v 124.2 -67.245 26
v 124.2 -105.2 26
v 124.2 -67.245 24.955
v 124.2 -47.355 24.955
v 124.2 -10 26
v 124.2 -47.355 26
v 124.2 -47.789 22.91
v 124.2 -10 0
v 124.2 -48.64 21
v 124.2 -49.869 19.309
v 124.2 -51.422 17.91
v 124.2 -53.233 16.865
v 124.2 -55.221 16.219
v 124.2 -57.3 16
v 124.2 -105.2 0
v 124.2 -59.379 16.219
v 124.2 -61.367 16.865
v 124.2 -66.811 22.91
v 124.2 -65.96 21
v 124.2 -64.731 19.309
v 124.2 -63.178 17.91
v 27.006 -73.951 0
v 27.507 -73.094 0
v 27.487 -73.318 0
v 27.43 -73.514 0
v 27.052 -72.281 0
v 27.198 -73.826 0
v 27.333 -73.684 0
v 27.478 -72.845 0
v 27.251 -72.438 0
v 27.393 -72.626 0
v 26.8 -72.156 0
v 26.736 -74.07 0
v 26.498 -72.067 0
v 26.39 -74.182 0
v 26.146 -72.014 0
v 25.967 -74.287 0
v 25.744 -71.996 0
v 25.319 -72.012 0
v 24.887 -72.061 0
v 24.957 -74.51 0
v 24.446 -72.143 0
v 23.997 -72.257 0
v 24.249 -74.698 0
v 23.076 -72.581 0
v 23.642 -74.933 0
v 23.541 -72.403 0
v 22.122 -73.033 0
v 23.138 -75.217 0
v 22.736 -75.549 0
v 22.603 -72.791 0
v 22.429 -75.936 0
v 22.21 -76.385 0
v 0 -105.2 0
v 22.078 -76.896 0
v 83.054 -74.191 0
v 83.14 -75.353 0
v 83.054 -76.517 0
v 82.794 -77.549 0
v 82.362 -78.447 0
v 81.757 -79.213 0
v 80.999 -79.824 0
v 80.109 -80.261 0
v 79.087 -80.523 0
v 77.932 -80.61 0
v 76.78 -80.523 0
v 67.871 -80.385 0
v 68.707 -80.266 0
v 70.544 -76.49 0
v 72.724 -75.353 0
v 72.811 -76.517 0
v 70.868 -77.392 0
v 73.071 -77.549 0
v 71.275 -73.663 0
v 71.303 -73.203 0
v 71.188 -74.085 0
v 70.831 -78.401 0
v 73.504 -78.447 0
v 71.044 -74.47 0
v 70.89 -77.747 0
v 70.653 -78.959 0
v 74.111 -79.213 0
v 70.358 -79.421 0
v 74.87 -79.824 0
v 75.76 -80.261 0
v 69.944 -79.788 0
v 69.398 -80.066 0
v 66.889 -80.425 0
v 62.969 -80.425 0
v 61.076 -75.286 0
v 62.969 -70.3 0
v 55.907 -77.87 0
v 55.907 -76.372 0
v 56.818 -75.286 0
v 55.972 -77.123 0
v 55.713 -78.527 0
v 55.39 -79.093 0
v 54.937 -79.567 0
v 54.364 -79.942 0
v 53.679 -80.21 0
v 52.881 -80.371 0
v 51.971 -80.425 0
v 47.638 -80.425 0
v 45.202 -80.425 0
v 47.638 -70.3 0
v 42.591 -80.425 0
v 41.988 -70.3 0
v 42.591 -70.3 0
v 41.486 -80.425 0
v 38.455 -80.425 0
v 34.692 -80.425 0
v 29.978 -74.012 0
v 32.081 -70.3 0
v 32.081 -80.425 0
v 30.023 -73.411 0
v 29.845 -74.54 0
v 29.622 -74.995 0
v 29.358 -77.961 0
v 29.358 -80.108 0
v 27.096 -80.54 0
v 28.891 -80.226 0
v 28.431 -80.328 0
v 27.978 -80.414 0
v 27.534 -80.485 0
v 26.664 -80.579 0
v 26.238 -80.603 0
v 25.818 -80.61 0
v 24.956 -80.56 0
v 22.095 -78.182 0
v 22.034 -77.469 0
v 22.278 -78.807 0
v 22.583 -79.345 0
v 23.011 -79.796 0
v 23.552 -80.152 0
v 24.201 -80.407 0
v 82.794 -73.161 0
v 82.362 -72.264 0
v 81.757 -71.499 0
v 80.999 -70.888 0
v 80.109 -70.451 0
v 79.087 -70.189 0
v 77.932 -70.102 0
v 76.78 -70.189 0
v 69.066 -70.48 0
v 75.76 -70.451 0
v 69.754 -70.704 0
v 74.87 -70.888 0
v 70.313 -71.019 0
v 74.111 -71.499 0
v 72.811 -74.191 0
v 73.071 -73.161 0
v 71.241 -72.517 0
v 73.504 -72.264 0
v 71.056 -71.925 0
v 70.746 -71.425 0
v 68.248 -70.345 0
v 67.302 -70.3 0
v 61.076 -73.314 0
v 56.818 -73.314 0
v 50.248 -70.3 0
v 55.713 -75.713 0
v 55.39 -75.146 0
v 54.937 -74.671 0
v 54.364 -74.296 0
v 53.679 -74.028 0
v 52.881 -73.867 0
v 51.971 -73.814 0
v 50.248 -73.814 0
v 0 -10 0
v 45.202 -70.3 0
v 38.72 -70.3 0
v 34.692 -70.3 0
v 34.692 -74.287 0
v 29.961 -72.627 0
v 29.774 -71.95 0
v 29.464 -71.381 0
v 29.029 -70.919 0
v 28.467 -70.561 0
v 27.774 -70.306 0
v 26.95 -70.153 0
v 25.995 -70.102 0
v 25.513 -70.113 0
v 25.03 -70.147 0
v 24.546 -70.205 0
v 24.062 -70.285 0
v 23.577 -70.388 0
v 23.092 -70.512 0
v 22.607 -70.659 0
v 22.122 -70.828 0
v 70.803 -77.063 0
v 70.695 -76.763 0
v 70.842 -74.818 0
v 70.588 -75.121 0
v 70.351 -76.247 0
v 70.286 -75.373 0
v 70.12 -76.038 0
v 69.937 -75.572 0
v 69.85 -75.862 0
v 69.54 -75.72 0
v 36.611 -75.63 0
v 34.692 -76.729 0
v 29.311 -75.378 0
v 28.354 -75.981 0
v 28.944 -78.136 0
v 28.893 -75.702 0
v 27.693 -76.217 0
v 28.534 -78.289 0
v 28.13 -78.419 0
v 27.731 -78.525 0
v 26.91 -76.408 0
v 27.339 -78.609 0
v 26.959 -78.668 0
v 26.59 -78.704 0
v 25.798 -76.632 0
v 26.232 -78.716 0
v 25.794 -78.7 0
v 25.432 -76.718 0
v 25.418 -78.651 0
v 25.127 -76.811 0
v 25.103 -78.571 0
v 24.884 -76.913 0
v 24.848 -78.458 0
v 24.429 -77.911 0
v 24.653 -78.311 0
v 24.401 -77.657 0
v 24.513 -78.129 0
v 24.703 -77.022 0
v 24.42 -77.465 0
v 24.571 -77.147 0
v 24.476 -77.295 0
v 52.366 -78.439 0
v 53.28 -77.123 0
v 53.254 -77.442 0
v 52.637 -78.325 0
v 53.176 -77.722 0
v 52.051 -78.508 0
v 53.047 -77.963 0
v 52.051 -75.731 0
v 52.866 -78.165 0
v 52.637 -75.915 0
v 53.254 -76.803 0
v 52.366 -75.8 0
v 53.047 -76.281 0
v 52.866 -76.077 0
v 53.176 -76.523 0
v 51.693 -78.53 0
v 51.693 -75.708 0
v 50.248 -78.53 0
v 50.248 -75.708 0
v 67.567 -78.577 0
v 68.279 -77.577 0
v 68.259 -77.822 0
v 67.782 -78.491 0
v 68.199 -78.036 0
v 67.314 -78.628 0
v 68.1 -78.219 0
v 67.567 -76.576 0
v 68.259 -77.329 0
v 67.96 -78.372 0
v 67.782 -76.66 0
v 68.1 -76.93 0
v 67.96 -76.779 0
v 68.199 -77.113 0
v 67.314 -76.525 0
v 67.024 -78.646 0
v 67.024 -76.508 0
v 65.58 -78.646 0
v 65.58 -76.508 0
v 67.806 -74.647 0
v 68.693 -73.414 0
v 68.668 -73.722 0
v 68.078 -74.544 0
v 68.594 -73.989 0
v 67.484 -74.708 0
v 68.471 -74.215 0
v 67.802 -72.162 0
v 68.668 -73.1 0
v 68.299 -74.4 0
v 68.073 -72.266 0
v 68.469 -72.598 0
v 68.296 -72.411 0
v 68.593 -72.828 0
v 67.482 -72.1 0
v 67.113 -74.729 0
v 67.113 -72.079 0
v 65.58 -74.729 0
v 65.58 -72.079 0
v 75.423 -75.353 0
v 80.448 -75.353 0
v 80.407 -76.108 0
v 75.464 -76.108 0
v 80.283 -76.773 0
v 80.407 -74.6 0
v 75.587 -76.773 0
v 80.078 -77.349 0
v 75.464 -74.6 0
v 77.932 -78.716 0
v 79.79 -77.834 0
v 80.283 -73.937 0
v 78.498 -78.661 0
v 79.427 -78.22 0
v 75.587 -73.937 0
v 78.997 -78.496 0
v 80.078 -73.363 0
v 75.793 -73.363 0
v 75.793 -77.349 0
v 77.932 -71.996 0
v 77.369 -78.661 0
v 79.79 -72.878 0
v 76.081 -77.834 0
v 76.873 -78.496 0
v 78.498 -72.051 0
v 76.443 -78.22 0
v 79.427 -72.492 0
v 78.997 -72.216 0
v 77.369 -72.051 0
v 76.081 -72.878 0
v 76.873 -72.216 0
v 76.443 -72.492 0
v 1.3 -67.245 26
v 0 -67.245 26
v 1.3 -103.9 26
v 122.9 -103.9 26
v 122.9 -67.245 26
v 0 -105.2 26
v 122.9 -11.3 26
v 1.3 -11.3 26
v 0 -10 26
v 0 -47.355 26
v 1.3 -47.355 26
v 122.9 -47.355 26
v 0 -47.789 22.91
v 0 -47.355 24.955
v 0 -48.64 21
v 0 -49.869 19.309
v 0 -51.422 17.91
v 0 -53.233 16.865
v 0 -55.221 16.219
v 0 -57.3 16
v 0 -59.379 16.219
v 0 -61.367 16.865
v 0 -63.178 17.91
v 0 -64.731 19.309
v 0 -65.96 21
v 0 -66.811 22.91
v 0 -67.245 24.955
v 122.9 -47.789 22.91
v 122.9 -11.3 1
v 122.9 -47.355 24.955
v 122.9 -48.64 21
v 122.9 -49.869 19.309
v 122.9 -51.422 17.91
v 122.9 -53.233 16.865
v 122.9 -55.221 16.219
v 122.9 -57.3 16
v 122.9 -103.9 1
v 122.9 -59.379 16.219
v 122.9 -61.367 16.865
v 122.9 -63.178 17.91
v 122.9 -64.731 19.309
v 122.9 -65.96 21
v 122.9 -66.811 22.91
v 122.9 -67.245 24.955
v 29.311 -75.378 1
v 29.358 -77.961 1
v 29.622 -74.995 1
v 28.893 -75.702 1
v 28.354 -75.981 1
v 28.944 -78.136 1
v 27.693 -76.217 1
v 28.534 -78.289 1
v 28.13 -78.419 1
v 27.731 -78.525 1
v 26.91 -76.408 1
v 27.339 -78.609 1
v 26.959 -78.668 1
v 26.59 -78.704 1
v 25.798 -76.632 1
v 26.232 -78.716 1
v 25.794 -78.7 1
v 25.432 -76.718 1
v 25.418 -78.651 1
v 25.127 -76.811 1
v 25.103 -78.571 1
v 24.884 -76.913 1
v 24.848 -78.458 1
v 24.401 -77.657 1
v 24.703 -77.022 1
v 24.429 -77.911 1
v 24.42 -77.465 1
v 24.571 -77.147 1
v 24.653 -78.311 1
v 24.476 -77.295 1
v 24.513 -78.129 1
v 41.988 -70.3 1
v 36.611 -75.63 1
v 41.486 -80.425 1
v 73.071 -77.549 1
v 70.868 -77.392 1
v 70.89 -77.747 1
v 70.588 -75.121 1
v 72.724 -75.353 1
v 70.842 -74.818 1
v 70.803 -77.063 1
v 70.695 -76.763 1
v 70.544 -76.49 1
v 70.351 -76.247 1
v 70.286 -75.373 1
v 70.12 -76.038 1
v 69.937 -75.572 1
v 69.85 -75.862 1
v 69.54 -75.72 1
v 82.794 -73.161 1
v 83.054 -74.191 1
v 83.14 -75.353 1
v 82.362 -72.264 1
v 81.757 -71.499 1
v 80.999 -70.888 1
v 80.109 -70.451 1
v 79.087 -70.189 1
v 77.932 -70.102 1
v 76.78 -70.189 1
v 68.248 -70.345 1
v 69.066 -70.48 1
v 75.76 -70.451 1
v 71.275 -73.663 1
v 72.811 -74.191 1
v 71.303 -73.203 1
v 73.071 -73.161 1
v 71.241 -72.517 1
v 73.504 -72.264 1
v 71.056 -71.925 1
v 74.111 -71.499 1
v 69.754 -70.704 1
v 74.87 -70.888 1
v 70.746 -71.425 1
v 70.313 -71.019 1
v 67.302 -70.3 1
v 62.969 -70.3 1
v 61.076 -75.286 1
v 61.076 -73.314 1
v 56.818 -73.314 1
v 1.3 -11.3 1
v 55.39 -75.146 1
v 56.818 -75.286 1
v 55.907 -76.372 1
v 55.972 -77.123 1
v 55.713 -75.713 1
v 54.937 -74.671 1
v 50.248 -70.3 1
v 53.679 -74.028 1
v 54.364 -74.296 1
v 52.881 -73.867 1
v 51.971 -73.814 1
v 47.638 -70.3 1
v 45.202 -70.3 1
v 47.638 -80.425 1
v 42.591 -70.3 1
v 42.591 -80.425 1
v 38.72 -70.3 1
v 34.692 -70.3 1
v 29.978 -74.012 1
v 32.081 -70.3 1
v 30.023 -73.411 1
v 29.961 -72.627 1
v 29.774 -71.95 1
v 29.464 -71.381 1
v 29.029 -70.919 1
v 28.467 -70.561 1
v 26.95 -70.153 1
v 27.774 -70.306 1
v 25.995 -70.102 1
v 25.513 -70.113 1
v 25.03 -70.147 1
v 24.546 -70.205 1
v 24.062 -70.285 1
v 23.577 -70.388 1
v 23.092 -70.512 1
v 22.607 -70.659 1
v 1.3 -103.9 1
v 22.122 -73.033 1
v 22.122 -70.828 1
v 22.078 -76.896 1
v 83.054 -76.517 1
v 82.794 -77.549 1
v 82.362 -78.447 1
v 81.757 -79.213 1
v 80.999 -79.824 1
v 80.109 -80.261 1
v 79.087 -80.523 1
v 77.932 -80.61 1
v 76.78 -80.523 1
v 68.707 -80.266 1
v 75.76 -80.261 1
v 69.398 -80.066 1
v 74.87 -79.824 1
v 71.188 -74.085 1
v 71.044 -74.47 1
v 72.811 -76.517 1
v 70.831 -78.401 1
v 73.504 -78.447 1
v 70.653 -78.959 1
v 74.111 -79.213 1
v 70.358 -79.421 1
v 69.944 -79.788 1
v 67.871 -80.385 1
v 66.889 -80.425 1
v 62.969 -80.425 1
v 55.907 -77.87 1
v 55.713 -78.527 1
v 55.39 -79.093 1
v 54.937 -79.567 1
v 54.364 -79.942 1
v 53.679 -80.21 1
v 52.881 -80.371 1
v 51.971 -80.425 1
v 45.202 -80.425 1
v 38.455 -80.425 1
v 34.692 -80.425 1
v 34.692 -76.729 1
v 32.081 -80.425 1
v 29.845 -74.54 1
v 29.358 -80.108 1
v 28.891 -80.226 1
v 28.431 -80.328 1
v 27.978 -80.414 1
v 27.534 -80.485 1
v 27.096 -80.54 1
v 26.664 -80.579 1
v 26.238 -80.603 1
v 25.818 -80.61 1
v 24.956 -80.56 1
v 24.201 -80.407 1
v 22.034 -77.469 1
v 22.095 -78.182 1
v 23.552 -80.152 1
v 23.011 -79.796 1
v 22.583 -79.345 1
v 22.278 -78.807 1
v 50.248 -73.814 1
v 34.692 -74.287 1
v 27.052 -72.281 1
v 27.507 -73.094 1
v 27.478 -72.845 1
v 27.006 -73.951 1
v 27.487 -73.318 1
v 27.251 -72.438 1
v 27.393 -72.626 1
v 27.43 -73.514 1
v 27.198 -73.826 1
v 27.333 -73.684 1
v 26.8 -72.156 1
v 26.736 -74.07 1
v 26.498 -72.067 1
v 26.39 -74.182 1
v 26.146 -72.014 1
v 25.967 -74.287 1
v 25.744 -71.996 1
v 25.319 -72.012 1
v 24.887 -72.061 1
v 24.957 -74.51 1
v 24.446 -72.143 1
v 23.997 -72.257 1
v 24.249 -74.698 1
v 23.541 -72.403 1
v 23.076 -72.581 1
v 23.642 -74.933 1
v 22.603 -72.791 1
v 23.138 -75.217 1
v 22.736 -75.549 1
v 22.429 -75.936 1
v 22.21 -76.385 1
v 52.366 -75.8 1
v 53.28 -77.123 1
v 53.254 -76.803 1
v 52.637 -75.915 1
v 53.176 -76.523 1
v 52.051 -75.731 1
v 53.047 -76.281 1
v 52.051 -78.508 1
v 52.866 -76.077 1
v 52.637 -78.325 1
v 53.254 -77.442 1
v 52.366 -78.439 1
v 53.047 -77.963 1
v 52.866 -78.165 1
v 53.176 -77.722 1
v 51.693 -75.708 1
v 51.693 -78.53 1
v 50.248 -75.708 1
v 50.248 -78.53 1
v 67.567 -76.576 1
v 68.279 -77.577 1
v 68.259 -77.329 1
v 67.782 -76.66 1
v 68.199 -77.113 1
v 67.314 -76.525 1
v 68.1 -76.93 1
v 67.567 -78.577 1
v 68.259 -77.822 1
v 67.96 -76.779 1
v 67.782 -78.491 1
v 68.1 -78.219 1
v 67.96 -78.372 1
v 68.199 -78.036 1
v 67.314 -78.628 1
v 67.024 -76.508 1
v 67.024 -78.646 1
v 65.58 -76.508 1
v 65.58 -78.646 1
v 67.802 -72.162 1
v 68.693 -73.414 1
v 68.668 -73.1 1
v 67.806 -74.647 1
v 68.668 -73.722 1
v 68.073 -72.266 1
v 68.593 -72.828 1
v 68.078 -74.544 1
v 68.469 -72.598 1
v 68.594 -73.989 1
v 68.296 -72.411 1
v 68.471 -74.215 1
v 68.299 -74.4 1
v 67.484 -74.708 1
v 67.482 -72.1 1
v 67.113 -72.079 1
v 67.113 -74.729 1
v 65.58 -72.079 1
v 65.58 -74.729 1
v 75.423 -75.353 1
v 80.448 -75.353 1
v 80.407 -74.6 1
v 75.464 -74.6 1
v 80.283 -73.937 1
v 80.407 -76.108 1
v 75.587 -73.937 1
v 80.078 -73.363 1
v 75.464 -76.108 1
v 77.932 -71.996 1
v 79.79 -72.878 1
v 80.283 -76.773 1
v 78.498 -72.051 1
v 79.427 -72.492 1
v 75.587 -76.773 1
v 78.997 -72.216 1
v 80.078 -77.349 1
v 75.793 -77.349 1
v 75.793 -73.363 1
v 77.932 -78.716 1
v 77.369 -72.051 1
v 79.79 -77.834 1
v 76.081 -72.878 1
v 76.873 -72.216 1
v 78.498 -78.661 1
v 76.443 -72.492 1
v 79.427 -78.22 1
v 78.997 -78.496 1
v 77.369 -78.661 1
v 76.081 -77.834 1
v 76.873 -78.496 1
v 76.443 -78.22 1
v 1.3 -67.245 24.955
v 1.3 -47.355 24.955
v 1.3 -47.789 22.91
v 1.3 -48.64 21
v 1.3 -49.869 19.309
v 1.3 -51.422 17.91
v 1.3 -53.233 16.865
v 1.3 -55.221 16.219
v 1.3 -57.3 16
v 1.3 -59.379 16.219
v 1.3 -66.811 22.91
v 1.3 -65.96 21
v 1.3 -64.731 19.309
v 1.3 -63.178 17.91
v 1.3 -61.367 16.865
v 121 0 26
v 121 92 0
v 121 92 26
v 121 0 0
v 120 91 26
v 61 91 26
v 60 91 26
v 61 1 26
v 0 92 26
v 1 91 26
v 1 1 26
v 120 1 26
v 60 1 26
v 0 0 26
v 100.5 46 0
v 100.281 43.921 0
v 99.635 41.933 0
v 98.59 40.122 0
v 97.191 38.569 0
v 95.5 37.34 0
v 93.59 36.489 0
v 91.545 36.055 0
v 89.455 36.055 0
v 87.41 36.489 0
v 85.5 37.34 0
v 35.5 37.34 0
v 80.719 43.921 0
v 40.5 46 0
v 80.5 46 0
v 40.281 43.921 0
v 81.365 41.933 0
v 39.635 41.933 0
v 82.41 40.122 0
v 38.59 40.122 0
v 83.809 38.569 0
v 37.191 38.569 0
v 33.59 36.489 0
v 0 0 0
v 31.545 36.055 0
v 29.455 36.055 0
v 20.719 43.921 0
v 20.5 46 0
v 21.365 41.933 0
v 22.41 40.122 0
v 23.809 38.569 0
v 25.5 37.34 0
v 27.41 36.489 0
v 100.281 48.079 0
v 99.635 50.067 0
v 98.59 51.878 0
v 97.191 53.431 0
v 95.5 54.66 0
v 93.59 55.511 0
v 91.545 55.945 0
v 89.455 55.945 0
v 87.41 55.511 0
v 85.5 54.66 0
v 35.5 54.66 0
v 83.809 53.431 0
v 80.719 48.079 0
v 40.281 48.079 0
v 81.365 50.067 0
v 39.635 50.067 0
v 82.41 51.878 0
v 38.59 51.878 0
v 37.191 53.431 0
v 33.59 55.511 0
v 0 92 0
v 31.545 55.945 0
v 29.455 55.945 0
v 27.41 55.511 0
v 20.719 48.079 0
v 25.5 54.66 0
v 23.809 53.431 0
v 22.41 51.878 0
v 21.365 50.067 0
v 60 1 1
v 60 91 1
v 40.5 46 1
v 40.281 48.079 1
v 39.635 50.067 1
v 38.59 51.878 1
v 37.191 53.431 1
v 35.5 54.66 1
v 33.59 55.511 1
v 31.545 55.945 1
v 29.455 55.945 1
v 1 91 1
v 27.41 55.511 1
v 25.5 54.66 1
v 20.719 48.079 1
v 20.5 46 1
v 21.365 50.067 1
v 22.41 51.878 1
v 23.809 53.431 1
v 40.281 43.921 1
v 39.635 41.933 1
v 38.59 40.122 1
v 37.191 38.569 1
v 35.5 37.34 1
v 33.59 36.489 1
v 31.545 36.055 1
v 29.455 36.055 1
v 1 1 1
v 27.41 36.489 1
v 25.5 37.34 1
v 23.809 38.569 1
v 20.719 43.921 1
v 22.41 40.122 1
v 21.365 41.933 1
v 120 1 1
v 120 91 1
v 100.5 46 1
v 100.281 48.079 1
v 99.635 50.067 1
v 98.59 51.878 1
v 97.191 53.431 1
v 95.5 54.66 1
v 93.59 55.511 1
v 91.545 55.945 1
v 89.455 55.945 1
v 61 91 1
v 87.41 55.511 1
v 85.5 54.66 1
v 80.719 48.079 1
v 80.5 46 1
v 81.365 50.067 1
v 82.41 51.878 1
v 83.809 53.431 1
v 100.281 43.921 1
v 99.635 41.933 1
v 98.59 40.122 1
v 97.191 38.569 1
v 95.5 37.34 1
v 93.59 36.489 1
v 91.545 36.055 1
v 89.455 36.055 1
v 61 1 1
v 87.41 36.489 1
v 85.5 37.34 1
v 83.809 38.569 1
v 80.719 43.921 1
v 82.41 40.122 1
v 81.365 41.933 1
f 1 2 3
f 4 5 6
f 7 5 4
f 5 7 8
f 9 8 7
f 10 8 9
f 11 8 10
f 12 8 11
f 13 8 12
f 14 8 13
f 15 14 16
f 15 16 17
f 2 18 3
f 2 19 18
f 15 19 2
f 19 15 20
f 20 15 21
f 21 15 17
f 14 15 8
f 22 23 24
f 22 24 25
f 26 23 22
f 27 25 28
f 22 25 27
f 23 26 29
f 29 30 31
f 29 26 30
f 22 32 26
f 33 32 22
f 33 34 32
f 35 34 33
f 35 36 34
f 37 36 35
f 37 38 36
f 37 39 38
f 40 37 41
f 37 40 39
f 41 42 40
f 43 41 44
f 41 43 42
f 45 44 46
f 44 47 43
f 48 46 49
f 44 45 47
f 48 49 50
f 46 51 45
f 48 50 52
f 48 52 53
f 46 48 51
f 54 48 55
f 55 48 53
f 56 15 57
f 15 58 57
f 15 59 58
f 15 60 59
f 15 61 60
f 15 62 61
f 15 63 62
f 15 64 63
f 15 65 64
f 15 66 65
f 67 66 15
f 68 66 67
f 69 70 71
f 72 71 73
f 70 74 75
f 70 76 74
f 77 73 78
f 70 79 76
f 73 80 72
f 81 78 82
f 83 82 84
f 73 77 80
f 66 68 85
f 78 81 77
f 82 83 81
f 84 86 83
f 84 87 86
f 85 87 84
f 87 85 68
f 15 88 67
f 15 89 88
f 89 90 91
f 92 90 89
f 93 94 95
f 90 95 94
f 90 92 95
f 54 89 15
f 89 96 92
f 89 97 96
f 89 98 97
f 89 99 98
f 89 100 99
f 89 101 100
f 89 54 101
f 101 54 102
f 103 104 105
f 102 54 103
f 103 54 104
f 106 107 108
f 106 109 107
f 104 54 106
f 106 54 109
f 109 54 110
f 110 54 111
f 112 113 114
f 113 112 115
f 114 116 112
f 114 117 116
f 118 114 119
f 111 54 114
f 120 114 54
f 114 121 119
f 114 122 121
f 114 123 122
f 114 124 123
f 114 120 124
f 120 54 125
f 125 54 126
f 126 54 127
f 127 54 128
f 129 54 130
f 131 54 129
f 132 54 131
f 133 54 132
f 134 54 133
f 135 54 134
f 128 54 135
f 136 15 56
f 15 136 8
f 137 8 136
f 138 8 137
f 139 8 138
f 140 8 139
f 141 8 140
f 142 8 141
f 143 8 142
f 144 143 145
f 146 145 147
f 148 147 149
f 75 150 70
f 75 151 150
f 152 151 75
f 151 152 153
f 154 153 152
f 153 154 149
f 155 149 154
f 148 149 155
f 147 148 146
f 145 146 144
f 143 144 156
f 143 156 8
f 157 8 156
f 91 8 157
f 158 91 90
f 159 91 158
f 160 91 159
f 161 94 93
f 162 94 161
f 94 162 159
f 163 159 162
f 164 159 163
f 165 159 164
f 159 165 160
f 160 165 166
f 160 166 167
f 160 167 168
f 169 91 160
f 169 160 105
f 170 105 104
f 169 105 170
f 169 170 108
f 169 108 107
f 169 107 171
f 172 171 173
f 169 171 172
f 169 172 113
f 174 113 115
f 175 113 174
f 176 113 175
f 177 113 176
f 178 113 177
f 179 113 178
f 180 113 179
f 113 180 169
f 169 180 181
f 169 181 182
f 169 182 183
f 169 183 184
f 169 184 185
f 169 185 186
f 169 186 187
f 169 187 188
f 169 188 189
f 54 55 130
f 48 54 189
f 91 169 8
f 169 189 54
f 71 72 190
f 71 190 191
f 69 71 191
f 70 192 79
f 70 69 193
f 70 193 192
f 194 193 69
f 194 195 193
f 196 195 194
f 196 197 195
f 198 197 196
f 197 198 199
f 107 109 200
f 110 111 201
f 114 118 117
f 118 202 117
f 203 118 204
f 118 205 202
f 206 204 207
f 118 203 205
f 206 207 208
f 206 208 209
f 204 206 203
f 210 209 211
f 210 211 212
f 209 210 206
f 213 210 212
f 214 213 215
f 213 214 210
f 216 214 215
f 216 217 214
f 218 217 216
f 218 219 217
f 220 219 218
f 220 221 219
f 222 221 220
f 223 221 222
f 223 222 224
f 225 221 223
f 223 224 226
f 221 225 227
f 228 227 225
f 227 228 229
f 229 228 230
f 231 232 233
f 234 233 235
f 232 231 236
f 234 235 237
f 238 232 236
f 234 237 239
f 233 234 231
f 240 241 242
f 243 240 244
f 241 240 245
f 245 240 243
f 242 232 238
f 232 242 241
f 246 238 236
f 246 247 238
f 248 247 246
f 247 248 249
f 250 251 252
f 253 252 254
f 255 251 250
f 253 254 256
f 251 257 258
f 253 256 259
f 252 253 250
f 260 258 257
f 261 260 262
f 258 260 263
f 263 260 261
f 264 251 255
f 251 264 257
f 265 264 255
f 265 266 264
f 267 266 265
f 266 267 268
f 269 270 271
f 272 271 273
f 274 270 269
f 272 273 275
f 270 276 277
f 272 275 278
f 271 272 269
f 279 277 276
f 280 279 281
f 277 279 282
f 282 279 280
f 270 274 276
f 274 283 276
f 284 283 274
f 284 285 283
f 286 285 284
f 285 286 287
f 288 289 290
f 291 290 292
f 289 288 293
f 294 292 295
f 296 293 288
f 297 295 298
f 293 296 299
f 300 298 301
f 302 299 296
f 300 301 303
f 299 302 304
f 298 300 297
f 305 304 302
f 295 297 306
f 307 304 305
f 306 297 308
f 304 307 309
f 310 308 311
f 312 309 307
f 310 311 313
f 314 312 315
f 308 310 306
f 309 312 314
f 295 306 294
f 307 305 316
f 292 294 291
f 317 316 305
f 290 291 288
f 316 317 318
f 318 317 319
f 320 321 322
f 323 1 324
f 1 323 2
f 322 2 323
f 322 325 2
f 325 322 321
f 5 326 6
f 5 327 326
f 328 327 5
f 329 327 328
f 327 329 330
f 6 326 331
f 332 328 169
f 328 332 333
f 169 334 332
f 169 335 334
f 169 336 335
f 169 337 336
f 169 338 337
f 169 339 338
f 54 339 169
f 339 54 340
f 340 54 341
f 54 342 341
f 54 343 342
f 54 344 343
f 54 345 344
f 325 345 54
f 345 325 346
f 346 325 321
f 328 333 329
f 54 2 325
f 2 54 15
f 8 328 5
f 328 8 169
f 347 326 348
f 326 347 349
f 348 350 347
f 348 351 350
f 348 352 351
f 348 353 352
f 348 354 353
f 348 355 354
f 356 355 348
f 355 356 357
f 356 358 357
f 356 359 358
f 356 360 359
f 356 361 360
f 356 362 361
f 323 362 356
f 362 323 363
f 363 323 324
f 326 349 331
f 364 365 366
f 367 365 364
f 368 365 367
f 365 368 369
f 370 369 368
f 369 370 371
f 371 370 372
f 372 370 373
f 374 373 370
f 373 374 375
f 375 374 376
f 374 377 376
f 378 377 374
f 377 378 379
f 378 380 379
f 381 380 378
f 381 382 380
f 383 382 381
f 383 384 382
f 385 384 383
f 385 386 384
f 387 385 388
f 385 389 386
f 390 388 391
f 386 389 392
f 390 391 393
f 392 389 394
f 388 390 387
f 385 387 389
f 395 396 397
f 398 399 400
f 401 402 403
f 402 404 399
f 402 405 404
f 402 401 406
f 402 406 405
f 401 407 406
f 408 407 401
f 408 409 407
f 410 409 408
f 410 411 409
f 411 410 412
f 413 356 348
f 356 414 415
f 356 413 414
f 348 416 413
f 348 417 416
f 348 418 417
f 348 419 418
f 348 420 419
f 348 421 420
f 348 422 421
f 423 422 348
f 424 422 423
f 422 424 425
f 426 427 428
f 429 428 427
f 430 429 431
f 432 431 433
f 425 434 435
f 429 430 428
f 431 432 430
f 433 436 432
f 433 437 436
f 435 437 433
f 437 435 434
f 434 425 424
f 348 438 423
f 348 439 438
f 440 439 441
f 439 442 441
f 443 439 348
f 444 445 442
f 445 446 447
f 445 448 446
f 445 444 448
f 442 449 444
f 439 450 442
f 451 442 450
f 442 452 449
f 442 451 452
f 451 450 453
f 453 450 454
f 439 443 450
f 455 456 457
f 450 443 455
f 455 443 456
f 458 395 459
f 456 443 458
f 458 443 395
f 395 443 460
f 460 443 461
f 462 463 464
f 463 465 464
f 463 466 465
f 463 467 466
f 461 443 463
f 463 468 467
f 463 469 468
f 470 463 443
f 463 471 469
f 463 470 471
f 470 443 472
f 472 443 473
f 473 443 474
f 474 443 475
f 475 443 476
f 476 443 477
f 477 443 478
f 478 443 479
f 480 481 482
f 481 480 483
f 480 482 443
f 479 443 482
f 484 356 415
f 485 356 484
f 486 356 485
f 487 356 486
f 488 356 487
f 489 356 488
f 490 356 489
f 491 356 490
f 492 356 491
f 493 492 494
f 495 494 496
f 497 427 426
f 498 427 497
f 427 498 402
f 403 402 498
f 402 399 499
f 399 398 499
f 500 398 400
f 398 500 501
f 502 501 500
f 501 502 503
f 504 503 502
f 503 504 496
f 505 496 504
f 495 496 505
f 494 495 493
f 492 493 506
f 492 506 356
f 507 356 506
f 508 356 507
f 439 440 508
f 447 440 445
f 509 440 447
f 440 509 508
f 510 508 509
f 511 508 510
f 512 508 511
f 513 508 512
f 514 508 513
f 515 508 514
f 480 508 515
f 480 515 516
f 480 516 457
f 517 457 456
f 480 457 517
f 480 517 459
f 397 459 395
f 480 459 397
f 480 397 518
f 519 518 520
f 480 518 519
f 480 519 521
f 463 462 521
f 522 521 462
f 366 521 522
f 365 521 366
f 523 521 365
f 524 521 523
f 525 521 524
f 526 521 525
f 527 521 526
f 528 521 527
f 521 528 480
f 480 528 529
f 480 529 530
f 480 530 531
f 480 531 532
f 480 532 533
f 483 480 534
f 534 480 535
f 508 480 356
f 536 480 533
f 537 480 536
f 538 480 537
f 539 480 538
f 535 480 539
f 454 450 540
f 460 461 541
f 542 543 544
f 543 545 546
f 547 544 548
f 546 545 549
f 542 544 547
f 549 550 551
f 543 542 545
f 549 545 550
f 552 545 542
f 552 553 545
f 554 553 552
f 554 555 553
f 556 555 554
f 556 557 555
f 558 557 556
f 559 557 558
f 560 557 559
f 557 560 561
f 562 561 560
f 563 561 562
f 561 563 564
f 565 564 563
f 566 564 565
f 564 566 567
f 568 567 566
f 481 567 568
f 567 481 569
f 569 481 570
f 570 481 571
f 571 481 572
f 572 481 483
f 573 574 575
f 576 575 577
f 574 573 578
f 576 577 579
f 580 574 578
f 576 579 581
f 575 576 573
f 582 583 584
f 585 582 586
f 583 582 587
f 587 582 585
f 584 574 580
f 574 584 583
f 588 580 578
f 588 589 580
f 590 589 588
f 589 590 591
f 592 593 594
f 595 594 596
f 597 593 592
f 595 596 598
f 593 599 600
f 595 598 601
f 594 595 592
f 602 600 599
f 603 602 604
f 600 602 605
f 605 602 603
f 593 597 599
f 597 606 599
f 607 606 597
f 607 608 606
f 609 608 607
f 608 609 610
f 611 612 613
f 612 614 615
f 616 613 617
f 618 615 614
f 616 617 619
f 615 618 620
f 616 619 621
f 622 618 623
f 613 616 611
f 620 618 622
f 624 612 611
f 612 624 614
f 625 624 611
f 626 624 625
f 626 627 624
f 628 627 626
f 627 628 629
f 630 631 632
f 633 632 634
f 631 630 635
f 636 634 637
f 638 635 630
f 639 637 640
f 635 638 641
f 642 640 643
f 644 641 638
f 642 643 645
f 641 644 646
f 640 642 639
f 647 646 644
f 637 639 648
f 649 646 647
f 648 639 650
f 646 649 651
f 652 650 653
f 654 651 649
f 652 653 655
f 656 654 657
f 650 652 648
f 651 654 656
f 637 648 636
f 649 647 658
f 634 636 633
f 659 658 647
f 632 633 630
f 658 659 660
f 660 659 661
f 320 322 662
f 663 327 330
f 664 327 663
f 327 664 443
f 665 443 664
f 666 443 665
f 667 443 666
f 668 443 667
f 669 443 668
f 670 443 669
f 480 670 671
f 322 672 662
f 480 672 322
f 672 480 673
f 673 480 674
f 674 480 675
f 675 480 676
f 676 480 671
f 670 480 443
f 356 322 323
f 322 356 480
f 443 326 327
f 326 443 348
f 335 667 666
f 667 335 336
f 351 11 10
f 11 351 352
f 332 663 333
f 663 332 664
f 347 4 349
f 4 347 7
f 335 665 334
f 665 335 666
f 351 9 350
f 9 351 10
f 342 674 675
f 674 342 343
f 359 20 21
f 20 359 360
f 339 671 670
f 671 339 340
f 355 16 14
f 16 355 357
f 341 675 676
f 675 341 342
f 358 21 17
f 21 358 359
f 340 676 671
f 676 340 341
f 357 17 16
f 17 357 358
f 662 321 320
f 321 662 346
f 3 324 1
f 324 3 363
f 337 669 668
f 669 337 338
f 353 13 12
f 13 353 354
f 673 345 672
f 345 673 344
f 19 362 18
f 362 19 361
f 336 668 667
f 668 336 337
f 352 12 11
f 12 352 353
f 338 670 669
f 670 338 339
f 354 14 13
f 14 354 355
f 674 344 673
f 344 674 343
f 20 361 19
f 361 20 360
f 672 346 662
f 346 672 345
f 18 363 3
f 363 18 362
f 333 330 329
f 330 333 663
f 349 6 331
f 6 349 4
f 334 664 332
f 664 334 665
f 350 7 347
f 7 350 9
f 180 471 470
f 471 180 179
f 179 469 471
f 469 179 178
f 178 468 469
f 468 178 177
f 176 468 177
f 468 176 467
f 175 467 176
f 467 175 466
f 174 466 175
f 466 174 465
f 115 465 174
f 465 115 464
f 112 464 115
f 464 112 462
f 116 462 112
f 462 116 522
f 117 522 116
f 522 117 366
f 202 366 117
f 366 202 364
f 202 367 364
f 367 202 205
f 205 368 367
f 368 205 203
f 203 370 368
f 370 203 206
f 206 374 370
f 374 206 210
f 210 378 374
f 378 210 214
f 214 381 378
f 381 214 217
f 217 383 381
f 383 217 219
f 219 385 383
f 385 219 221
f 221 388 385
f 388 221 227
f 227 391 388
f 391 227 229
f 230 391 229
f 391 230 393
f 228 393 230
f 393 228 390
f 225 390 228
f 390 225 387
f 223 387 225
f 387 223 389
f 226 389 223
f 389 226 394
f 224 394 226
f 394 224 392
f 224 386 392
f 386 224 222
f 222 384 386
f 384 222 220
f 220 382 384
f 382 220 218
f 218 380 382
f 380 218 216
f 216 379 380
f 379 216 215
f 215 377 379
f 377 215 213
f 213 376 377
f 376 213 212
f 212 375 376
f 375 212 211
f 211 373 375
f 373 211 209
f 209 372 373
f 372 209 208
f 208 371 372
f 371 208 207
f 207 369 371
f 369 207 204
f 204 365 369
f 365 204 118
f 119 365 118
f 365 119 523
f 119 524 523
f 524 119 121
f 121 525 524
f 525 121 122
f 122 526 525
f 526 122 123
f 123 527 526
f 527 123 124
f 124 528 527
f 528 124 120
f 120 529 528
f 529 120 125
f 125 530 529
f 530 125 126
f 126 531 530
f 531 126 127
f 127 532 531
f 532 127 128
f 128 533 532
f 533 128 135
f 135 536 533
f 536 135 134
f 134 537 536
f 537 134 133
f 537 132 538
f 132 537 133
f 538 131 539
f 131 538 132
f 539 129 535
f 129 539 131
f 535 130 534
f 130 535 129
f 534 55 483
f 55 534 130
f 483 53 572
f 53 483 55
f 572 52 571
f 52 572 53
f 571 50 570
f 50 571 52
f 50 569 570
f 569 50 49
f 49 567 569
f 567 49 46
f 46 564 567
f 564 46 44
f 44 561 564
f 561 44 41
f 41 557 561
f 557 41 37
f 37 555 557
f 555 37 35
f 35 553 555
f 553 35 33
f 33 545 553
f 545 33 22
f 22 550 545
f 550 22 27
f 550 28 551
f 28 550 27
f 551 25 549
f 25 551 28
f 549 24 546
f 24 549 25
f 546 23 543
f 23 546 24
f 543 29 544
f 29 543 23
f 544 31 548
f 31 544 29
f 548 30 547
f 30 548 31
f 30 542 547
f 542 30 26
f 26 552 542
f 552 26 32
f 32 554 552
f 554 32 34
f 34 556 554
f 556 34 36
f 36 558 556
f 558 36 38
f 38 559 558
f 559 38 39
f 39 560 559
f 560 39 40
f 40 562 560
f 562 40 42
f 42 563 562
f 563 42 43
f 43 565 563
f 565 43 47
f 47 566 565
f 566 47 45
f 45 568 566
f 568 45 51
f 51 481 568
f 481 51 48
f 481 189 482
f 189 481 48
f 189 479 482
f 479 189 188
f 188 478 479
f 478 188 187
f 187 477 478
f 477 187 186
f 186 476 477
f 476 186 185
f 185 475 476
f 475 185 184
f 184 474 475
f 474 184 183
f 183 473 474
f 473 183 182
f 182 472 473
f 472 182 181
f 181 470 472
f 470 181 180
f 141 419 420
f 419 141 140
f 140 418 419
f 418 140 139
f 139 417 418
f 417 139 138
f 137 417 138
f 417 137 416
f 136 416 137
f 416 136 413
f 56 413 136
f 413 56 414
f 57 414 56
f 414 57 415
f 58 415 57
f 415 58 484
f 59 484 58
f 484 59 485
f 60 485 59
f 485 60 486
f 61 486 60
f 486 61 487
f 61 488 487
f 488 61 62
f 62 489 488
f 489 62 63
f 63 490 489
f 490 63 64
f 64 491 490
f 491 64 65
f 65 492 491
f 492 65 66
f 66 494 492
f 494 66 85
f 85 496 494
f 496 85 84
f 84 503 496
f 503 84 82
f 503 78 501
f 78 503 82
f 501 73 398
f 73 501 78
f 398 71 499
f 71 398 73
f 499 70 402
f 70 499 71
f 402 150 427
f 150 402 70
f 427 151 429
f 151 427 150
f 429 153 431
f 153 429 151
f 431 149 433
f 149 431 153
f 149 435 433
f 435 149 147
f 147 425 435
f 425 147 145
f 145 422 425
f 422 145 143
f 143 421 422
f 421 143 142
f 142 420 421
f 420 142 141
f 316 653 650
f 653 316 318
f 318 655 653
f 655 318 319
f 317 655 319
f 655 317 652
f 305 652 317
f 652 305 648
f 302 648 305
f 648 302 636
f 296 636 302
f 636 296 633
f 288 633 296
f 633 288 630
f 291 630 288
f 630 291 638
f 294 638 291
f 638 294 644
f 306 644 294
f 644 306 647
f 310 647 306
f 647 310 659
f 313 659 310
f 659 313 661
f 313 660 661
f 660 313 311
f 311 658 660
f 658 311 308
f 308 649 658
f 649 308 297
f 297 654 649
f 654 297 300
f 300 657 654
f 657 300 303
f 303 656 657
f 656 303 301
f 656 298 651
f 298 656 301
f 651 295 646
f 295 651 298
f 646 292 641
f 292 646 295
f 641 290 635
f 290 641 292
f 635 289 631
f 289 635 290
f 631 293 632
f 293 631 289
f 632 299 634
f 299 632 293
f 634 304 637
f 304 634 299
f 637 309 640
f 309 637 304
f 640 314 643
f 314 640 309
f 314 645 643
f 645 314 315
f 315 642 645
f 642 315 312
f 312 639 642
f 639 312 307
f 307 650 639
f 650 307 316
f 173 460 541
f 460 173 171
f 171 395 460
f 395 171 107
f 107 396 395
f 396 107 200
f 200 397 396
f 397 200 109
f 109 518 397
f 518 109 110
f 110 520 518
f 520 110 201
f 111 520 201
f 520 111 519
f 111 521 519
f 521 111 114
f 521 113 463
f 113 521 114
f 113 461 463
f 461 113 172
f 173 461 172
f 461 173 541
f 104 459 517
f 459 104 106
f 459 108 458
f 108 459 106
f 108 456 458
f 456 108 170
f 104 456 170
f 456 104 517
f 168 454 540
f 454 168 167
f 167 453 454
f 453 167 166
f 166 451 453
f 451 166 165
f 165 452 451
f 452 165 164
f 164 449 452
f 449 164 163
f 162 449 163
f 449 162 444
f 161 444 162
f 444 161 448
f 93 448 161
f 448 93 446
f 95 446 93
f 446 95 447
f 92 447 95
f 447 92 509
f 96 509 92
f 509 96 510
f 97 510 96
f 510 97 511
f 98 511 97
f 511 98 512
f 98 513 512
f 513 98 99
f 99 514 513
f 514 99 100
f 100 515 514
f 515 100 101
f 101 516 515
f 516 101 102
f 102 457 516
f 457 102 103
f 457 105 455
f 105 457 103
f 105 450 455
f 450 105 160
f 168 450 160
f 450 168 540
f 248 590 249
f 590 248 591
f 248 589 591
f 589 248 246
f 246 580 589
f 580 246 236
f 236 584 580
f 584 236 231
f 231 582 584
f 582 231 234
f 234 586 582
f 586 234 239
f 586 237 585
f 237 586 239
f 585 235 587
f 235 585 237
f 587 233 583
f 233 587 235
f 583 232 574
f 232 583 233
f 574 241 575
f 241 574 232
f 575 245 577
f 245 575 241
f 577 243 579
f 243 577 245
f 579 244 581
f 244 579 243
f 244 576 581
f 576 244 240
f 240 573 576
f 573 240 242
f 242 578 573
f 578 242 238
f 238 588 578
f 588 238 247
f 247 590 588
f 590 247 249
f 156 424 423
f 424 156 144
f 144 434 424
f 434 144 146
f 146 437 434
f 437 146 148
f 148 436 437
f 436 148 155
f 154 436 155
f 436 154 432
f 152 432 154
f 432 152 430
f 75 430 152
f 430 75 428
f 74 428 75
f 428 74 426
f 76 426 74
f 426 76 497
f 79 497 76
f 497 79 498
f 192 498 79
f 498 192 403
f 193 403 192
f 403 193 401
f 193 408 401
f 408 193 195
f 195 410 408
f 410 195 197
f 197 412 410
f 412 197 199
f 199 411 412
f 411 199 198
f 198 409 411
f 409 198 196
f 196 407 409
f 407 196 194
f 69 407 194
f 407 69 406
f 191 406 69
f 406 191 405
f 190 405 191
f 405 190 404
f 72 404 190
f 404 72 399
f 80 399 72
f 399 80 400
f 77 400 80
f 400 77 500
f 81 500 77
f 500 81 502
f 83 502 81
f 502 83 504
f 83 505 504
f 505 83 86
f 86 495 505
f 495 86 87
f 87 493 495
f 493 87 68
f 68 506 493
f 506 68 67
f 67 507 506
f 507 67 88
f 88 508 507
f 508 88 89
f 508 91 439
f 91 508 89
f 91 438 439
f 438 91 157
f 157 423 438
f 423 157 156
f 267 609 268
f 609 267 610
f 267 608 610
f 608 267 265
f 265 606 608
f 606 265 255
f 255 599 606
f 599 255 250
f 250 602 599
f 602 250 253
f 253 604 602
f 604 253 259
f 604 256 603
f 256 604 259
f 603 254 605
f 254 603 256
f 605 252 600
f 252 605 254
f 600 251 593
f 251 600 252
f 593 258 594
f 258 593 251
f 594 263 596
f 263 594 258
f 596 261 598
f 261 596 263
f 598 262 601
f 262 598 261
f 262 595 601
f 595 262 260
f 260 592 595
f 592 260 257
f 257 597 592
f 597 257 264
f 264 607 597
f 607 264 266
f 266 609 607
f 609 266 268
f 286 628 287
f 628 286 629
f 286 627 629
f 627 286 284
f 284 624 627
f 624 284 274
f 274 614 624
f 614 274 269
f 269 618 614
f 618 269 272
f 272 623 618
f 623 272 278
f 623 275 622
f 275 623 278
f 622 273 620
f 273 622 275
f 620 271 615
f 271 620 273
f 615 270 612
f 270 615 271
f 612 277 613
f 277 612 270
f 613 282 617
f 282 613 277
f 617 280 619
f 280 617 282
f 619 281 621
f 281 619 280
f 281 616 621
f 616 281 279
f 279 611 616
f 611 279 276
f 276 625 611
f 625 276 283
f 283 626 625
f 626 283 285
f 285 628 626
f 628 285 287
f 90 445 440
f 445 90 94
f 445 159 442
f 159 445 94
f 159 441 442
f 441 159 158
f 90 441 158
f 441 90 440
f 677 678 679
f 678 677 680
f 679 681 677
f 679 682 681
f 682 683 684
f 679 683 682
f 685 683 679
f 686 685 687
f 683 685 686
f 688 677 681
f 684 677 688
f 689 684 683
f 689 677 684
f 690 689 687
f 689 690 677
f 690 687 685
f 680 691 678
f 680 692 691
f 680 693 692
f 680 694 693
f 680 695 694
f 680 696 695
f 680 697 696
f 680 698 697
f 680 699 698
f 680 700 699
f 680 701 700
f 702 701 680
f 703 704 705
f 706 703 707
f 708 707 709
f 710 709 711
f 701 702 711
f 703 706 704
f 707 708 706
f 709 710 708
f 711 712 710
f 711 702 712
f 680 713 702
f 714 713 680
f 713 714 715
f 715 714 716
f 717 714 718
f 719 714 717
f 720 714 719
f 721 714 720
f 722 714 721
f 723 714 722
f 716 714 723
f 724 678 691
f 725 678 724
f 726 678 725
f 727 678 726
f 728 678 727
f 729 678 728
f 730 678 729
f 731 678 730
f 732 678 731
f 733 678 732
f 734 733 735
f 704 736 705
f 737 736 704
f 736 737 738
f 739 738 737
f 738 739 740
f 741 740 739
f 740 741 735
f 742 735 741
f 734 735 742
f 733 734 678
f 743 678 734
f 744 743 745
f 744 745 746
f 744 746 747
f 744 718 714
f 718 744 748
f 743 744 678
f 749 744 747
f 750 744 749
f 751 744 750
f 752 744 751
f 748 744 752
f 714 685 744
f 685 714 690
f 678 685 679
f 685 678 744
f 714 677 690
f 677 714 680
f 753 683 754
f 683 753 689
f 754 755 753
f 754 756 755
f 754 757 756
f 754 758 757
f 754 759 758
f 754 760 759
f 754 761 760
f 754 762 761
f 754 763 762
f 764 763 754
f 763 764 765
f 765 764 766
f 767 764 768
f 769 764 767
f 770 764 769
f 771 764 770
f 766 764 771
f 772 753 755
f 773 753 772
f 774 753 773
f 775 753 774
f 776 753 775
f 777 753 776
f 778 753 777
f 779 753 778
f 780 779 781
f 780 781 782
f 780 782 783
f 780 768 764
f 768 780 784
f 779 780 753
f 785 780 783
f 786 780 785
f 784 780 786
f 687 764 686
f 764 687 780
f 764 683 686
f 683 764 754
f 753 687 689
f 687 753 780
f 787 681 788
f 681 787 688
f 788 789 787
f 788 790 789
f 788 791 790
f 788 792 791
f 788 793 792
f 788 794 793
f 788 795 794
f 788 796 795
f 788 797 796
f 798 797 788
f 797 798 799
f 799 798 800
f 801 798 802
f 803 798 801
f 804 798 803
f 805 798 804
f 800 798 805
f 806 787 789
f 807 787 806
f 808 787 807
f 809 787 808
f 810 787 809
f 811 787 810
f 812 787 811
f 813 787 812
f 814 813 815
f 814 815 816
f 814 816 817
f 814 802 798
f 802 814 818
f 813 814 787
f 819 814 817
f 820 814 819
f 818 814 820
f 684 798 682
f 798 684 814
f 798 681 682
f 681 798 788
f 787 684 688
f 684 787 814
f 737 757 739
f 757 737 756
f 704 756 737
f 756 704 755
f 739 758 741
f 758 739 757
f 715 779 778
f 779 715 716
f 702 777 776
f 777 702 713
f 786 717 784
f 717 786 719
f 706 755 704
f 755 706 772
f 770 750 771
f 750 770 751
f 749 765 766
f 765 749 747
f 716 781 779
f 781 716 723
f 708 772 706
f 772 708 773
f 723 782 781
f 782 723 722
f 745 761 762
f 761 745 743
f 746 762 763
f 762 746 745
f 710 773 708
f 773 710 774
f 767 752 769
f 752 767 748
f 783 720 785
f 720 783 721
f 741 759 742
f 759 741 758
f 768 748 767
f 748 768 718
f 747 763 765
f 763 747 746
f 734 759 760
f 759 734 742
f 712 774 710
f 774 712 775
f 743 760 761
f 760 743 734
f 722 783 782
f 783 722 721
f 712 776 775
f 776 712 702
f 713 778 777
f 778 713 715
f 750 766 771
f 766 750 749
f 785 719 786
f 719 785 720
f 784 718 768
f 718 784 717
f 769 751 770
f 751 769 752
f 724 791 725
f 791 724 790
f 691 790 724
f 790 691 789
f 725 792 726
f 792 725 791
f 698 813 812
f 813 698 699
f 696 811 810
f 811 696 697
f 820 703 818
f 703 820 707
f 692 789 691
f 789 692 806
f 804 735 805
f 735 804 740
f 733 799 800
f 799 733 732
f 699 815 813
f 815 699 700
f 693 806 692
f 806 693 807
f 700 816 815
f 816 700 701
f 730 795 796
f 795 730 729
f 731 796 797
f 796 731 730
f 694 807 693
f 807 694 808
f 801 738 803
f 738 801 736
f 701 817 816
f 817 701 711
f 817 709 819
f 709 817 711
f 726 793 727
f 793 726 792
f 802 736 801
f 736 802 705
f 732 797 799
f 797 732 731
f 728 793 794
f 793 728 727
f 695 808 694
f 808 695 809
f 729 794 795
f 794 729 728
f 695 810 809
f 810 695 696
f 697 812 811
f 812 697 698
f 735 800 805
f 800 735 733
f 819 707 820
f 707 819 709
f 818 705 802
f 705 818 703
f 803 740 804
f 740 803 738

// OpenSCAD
deckHeight = 50;
deckLength = 90;
deckWidth = 59;
wallThickness = 1;
fingerHoleDiameter = 20;
gap = 0.3;

// Planning for 2 piles with a guide between
module box(delta) {
    cube([deckWidth*2+3*wallThickness + 2 * delta,
          deckLength+2*wallThickness + 2 * delta,
          deckHeight/2 + wallThickness]);
}

module deck() {
    cube([deckWidth,deckLength,deckHeight/2+0.1]);
}

module boxBottom() {
    difference() {
        box(0);
        translate([wallThickness,wallThickness,wallThickness])
            deck();
        translate([deckWidth + 2*wallThickness,
          wallThickness,wallThickness])
            deck();
        translate([deckWidth/2 + wallThickness,
          deckLength/2 + wallThickness, -0.1])
            cylinder(h = wallThickness + 0.2, 
                d = fingerHoleDiameter);
        translate([3/2 * deckWidth + 2 * wallThickness,
          deckLength/2 + wallThickness, -0.1])
            cylinder(h = wallThickness + 0.2, 
                d = fingerHoleDiameter);
    }
}

module boxTop() {
    difference() {
        box(wallThickness + 2 * gap);
        translate([wallThickness + gap, wallThickness + gap, -wallThickness])
            box(gap);
        translate([-0.1, 
          deckLength/2 + 2 * wallThickness + gap, 0])
            rotate([0, 90, 0])
                cylinder(h = deckWidth*2 + 5*wallThickness + 5 * gap, d = fingerHoleDiameter);
        translate([deckHeight + 2 * wallThickness + gap,
            deckWidth + wallThickness + gap,
            deckHeight/2 - gap - 0.1])
        linear_extrude(height = wallThickness + 2* gap)
            text("SKIP-BO", font = "Verdana:style=Bold",            halign= "center");
    }
}


translate([0, -10, 
  deckHeight/2 + wallThickness])
    rotate([180, 0, 0])
        boxTop();

boxBottom();
